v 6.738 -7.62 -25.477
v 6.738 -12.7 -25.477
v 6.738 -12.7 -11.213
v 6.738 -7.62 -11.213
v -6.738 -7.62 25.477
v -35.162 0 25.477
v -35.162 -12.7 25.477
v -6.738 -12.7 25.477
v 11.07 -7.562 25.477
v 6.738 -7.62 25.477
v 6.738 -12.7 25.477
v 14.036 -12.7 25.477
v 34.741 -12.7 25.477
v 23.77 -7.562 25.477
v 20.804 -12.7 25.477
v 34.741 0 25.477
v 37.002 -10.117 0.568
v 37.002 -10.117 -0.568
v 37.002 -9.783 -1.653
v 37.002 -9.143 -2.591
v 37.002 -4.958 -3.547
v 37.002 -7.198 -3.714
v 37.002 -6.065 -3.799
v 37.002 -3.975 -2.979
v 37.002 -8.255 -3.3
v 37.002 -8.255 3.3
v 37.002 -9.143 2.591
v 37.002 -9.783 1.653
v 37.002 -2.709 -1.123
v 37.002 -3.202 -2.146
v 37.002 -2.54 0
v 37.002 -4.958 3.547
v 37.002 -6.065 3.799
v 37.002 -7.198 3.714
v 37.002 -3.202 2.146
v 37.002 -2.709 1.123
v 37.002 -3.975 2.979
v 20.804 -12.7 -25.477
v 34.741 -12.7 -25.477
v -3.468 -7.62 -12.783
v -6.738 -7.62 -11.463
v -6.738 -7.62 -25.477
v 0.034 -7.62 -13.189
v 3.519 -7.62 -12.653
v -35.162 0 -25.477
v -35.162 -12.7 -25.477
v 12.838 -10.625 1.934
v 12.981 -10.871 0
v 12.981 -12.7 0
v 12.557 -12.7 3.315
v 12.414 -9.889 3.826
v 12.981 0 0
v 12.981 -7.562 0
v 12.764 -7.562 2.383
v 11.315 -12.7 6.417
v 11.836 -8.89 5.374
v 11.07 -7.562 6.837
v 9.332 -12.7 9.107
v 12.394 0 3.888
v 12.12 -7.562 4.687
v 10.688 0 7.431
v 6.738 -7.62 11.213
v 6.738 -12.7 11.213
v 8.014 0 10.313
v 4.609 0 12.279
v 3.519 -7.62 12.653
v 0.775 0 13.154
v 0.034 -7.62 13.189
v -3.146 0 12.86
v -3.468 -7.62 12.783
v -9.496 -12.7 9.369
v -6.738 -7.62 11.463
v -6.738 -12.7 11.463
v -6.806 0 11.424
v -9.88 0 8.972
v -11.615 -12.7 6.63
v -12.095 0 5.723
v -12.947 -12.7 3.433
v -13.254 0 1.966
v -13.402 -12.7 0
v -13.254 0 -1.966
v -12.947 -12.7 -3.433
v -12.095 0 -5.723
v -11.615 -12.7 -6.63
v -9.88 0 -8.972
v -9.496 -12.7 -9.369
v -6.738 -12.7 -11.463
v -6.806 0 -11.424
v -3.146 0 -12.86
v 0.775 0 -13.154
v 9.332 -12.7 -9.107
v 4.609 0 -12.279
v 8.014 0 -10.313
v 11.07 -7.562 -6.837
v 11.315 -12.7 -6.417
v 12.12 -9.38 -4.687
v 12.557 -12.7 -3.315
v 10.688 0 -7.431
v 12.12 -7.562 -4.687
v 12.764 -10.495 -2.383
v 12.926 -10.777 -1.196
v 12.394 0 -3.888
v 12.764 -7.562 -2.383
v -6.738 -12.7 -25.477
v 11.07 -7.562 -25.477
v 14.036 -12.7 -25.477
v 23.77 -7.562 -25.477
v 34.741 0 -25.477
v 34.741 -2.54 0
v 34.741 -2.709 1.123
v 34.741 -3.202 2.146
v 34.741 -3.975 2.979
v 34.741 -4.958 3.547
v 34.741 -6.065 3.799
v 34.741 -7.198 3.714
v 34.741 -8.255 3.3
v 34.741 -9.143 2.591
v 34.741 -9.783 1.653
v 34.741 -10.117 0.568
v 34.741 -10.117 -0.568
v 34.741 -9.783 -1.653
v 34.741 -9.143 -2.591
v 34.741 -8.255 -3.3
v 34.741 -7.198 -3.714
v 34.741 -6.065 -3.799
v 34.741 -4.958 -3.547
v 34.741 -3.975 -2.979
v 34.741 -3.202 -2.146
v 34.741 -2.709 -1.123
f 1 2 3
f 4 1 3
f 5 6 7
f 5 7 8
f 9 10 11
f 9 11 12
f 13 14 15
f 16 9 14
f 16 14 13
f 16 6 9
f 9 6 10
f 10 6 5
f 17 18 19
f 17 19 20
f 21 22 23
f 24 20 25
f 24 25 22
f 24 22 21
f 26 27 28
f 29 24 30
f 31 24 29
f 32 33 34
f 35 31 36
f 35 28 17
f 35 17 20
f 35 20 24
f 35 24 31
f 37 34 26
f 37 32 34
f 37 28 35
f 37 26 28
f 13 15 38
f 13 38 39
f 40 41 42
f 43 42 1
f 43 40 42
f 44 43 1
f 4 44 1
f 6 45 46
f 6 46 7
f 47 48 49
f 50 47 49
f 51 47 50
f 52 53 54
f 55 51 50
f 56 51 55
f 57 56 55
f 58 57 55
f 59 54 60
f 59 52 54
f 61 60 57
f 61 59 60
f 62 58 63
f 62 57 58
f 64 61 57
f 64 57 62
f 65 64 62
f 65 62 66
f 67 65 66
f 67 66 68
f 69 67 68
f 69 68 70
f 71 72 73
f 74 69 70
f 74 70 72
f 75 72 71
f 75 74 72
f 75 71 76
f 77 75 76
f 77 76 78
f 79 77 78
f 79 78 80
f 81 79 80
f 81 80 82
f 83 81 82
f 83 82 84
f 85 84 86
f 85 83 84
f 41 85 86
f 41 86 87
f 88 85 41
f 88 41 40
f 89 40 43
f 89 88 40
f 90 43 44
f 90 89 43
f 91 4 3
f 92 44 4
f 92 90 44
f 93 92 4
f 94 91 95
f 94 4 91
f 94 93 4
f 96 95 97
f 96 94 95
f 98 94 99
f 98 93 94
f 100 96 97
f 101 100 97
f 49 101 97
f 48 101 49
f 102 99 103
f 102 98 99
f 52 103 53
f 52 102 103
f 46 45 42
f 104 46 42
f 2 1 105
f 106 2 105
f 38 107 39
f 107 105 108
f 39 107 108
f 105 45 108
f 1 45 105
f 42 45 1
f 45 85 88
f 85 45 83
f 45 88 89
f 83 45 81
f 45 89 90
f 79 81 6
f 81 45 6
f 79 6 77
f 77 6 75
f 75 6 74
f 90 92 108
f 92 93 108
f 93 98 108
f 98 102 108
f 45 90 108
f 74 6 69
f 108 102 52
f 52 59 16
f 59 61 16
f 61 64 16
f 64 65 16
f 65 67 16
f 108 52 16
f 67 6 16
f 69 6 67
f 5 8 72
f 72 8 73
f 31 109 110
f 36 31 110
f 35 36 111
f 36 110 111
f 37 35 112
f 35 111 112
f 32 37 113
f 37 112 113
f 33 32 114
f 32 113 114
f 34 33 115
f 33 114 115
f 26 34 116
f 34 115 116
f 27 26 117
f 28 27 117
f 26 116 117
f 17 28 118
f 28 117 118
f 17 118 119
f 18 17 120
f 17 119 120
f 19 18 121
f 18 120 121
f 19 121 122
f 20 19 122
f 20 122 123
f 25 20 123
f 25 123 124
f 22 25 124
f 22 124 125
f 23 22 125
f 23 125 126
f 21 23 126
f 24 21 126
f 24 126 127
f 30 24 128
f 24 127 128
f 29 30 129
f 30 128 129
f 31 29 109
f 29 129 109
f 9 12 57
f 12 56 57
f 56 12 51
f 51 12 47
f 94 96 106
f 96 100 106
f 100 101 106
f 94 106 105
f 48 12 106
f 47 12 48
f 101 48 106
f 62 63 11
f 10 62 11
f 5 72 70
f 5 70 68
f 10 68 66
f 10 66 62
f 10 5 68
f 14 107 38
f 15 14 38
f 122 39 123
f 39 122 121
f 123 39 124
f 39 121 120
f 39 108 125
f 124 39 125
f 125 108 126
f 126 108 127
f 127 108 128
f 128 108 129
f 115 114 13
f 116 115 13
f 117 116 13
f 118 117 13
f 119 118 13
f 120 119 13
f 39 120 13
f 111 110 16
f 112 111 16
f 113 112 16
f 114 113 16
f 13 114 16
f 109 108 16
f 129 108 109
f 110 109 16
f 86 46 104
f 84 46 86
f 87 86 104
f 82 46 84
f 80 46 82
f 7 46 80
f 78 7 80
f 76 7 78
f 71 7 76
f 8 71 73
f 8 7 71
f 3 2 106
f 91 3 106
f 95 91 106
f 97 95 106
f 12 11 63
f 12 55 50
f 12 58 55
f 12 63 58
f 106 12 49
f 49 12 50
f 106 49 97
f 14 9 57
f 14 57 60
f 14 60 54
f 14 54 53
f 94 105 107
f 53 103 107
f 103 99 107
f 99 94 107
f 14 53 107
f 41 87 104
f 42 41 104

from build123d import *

# Parameters (mm, degrees)
F0_W     = 69.9034725258
F0_H     = 50.9537383914
F0_R     = 13.1910844609
F1_DEPTH = 12.7
F3_DEPTH = 5.08
F5_DEPTH = 50.9547383914
F6_R     = 3.81
F7_DEPTH = 2.2606


with BuildPart() as f1:
    # F0 (on Front) → F1 (new body)
    with BuildSketch(Plane.XZ):
        with Locations((-0.2105524327, 0)):
            Rectangle(F0_W, F0_H)
        with Locations((-0.2105524327, 0)):
            Circle(F0_R, mode=Mode.SUBTRACT)
    extrude(amount=F1_DEPTH)

    # F2 (on face) → F3 (cut)
    with BuildSketch(Plane.XZ.offset(12.7)):
        with BuildLine():
            Line((6.7376832012, 25.4768691957), (-6.7376843654, 25.4768691957))
            Line((-6.7376843654, 25.4768691957), (-6.7376843654, 11.4630387764))
            ThreePointArc((-6.7376843654, 11.4630387764), (0.0343716306, 13.1888104641), (6.7376832012, 11.2127931771))
            Line((6.7376832012, 11.2127931771), (6.7376832012, 25.4768691957))
        make_face()
        with BuildLine():
            ThreePointArc((6.7376832012, -11.2127931771), (0.0343716306, -13.1888104641), (-6.7376843654, -11.4630387764))
            Line((-6.7376843654, -11.4630387764), (-6.7376843654, -25.4768691957))
            Line((-6.7376843654, -25.4768691957), (6.7376832012, -25.4768691957))
            Line((6.7376832012, -25.4768691957), (6.7376832012, -11.2127931771))
        make_face()
    extrude(amount=-F3_DEPTH, mode=Mode.SUBTRACT)

    # F4 (on face) → F5 (cut, through all)
    with BuildSketch(Plane(origin=(0, 0, -25.4768691957), x_dir=(1, 0, 0), z_dir=(0, 0, -1))):
        Polygon((20.8039732322, 12.7), (14.0363142386, 12.7), (11.0701437354, 7.5624419846), (23.7701437354, 7.5624419846), align=None)
    extrude(amount=-F5_DEPTH, mode=Mode.SUBTRACT)

    # F6 (on face) → F7 (join)
    with BuildSketch(Plane.YZ.offset(34.7411838302)):
        with Locations((-6.35, 0)):
            Circle(F6_R)
    extrude(amount=F7_DEPTH)


solid = f1.part
